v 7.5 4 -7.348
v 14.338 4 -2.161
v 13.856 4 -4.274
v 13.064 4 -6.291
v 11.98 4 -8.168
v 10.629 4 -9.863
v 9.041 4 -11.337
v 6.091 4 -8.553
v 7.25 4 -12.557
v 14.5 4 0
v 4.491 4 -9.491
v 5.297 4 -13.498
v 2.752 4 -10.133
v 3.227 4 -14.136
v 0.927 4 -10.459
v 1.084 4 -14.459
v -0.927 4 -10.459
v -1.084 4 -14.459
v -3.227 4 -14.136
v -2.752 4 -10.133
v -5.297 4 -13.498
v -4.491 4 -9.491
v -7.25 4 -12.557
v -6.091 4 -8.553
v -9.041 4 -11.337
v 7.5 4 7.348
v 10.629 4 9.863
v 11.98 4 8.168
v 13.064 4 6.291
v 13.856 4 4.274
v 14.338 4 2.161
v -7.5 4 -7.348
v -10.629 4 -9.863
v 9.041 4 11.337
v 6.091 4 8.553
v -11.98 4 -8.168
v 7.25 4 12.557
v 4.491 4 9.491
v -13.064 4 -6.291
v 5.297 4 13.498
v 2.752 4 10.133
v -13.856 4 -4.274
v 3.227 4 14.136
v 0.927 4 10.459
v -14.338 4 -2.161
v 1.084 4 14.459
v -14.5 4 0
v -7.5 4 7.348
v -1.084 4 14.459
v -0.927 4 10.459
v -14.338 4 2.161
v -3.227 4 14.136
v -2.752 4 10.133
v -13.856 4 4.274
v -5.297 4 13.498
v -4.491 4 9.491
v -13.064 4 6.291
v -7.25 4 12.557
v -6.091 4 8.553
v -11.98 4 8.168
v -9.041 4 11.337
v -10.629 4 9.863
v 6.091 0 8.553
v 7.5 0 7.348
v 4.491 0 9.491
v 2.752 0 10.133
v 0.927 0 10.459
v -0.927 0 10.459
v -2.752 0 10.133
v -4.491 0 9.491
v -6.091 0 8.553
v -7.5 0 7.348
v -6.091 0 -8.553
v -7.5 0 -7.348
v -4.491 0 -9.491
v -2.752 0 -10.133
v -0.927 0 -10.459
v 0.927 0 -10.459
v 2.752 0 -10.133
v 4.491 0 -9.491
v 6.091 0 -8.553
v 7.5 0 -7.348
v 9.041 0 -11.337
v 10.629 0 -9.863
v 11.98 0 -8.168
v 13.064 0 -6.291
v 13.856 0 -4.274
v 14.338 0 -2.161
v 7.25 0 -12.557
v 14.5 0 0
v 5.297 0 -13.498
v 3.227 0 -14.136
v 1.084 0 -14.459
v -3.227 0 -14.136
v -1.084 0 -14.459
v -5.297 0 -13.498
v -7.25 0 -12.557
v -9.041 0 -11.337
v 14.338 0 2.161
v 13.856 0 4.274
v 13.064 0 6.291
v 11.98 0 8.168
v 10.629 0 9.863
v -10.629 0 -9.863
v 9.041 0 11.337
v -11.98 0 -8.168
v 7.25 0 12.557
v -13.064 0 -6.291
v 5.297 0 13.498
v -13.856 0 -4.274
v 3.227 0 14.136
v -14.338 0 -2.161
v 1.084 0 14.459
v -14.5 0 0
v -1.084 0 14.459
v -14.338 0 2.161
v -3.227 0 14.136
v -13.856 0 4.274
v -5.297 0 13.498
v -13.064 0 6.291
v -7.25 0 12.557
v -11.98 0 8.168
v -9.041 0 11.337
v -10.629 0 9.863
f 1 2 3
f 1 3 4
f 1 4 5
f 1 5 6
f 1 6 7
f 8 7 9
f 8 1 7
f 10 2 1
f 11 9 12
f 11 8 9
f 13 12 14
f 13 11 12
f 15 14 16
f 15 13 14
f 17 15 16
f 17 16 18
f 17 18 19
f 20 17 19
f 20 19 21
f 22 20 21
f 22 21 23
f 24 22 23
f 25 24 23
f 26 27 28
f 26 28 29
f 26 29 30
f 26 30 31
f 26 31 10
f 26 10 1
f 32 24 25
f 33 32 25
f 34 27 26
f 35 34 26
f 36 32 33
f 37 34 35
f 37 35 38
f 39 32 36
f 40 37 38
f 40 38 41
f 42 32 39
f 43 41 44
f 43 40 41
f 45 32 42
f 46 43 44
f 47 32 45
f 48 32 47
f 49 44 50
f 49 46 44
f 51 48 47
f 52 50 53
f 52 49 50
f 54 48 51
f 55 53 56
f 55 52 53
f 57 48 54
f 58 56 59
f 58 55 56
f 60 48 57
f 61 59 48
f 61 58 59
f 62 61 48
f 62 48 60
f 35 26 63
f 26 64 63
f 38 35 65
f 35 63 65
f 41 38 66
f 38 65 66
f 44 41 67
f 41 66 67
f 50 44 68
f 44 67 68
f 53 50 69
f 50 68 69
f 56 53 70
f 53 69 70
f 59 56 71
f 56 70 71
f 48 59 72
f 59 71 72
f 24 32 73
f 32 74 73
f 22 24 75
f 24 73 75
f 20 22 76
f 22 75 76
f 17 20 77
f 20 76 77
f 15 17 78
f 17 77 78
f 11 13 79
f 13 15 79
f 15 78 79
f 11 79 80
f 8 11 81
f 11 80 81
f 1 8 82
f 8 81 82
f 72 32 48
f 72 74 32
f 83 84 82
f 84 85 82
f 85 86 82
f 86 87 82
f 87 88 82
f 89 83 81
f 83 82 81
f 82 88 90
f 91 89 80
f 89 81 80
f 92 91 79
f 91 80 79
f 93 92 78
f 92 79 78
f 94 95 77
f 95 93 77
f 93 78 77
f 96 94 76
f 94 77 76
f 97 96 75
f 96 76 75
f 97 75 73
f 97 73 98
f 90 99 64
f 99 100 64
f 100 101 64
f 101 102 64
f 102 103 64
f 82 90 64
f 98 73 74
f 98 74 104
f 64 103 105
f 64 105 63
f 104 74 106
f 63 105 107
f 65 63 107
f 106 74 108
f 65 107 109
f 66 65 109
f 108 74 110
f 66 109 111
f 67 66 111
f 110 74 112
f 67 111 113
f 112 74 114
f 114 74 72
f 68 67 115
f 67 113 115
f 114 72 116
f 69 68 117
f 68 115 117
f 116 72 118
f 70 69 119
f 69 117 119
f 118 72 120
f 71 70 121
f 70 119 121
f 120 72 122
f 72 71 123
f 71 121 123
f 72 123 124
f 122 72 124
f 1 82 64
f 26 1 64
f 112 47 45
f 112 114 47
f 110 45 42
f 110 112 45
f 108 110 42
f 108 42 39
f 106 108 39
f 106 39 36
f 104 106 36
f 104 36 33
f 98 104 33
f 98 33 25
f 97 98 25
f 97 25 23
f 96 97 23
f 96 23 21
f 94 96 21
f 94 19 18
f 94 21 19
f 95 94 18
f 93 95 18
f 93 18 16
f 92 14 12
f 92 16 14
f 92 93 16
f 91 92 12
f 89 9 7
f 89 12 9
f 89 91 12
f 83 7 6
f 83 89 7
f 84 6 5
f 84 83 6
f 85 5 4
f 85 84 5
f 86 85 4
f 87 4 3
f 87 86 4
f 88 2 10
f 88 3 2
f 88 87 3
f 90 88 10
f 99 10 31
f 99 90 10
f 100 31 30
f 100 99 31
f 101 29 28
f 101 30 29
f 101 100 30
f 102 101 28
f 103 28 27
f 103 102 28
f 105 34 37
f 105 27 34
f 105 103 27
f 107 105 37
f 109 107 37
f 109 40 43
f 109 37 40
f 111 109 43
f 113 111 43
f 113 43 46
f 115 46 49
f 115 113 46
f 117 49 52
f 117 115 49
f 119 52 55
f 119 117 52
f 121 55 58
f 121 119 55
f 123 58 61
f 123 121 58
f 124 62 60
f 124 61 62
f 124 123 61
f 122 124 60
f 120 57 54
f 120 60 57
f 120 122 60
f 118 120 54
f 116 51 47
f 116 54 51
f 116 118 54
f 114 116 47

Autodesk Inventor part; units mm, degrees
ref_plane "YZ Plane" through (0, 0, 0) normal (1, 0, 0) x (0, 1, 0)
ref_plane "XZ Plane" through (0, 0, 0) normal (0, 1, 0) x (-1, 0, 0)
ref_plane "XY Plane" through (0, 0, 0) normal (0, 0, 1) x (1, 0, 0)
sketch "Sketch1" plane through (0, 0, 0) normal (0, 1, 0) x (-1, 0, 0)
  circle A0 centre (0, 0) radius 14.5
  circle A1 centre (0, 0) radius 10.5
  line L0 (14.5, 0) -> (7.5, 0)
  line L1 (-14.5, 0) -> (-7.5, 0)
  line L2 (7.5, -7.3485) -> (7.5, 7.3485)
  line L3 (-7.5, -7.3485) -> (-7.5, 7.3485)
  dimension "d0" = 29
  dimension "d1" = 21
  dimension "d2" = 7
  dimension "d3" = 7
extrude "Extrusion1" add sketch "Sketch1" along normal blind 4 contours L0 A1 L1 A0 | A0 L1 A1 L0 | L0 L2 A1 | A1 L2 L0 | L1 L3 A1 | A1 L3 L1
properties part number "LoadCellFitting"
